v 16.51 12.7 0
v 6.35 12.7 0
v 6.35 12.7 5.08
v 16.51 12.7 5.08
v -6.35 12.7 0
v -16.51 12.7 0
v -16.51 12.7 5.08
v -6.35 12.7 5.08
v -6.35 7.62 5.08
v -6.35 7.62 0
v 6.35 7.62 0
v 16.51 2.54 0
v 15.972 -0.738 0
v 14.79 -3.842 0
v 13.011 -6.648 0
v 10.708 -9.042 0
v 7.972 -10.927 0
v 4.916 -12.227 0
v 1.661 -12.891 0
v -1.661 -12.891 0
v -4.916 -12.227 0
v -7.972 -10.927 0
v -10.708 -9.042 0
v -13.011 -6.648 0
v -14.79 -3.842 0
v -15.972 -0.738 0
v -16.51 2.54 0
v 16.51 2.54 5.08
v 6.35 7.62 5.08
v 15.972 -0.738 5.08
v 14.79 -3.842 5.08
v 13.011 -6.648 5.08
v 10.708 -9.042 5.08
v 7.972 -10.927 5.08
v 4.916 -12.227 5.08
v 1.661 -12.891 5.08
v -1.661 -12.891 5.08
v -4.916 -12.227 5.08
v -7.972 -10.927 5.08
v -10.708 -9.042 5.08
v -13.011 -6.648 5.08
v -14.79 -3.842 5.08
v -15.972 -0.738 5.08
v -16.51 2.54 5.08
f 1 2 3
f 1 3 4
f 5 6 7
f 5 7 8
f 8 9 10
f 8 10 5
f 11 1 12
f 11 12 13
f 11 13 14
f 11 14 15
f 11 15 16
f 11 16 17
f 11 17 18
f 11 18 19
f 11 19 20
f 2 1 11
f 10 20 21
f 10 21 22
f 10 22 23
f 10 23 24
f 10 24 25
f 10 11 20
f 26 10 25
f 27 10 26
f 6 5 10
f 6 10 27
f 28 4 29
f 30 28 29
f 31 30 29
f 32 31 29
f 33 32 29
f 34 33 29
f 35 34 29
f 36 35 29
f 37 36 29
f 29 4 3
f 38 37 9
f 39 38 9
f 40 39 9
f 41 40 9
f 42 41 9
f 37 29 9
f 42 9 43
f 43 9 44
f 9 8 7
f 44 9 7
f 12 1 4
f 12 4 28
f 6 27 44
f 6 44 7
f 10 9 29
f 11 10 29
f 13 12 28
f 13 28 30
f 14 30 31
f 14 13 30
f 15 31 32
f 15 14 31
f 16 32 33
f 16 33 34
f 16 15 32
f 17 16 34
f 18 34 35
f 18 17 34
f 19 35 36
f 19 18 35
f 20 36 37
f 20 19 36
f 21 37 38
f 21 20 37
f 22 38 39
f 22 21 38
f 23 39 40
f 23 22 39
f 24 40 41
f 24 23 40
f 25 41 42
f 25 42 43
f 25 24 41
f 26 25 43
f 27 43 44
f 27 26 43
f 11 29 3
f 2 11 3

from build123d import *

# Parameters (mm, degrees)
BOSS_EXTRUDE1_DEPTH = 5.08
SKETCH2_W           = 12.7
SKETCH2_H           = 5.08
CUT_EXTRUDE1_DEPTH  = 5.08


with BuildPart() as part:
    # Sketch1 → Boss-Extrude1 (new body)
    with BuildSketch(Plane.XY):
        with BuildLine():
            Line((-16.51, 12.7), (16.51, 12.7))
            Line((16.51, 12.7), (16.51, 2.54))
            ThreePointArc((16.51, 2.54), (0, -12.974722603), (-16.51, 2.54))
            Line((-16.51, 2.54), (-16.51, 12.7))
        make_face()
    extrude(amount=BOSS_EXTRUDE1_DEPTH)

    # Sketch2 → Cut-Extrude1 (cut)
    with BuildSketch(Plane.XY.offset(5.08)):
        with Locations((0, 10.16)):
            Rectangle(SKETCH2_W, SKETCH2_H)
    extrude(amount=-CUT_EXTRUDE1_DEPTH, mode=Mode.SUBTRACT)


solid = part.part
